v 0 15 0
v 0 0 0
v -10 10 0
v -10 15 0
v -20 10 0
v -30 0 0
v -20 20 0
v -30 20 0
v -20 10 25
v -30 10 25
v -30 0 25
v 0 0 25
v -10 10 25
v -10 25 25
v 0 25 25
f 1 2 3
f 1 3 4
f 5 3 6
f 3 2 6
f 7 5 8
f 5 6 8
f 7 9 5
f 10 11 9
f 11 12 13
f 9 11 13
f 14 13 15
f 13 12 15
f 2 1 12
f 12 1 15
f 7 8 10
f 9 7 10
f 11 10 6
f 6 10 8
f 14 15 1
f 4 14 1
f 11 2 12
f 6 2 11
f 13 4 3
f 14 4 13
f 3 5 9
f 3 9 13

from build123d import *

# Parameters (mm, degrees)
BOSS_EXTRUDE1_DEPTH = 25
BOSS_EXTRUDE2_DEPTH = 10
BOSS_EXTRUDE3_DEPTH = 10


with BuildPart() as part:
    # Sketch1 → Boss-Extrude1 (new body)
    with BuildSketch(Plane.XY):
        Polygon((-30, 10), (-10, 10), (-10, 15), (0, 15), (0, 0), (-30, 0), align=None)
    extrude(amount=BOSS_EXTRUDE1_DEPTH)

    # Sketch2 → Boss-Extrude2 (add)
    with BuildSketch(Plane.ZY.offset(30)):
        Polygon((0, 10), (0, 20), (25, 10), align=None)
    extrude(amount=-BOSS_EXTRUDE2_DEPTH)

    # Sketch3 → Boss-Extrude3 (add)
    with BuildSketch(Plane(origin=(0, 0, 0), x_dir=(0, 0, -1), z_dir=(1, 0, 0))):
        Polygon((-25, 15), (-25, 25), (0, 15), align=None)
    extrude(amount=-BOSS_EXTRUDE3_DEPTH)


solid = part.part
